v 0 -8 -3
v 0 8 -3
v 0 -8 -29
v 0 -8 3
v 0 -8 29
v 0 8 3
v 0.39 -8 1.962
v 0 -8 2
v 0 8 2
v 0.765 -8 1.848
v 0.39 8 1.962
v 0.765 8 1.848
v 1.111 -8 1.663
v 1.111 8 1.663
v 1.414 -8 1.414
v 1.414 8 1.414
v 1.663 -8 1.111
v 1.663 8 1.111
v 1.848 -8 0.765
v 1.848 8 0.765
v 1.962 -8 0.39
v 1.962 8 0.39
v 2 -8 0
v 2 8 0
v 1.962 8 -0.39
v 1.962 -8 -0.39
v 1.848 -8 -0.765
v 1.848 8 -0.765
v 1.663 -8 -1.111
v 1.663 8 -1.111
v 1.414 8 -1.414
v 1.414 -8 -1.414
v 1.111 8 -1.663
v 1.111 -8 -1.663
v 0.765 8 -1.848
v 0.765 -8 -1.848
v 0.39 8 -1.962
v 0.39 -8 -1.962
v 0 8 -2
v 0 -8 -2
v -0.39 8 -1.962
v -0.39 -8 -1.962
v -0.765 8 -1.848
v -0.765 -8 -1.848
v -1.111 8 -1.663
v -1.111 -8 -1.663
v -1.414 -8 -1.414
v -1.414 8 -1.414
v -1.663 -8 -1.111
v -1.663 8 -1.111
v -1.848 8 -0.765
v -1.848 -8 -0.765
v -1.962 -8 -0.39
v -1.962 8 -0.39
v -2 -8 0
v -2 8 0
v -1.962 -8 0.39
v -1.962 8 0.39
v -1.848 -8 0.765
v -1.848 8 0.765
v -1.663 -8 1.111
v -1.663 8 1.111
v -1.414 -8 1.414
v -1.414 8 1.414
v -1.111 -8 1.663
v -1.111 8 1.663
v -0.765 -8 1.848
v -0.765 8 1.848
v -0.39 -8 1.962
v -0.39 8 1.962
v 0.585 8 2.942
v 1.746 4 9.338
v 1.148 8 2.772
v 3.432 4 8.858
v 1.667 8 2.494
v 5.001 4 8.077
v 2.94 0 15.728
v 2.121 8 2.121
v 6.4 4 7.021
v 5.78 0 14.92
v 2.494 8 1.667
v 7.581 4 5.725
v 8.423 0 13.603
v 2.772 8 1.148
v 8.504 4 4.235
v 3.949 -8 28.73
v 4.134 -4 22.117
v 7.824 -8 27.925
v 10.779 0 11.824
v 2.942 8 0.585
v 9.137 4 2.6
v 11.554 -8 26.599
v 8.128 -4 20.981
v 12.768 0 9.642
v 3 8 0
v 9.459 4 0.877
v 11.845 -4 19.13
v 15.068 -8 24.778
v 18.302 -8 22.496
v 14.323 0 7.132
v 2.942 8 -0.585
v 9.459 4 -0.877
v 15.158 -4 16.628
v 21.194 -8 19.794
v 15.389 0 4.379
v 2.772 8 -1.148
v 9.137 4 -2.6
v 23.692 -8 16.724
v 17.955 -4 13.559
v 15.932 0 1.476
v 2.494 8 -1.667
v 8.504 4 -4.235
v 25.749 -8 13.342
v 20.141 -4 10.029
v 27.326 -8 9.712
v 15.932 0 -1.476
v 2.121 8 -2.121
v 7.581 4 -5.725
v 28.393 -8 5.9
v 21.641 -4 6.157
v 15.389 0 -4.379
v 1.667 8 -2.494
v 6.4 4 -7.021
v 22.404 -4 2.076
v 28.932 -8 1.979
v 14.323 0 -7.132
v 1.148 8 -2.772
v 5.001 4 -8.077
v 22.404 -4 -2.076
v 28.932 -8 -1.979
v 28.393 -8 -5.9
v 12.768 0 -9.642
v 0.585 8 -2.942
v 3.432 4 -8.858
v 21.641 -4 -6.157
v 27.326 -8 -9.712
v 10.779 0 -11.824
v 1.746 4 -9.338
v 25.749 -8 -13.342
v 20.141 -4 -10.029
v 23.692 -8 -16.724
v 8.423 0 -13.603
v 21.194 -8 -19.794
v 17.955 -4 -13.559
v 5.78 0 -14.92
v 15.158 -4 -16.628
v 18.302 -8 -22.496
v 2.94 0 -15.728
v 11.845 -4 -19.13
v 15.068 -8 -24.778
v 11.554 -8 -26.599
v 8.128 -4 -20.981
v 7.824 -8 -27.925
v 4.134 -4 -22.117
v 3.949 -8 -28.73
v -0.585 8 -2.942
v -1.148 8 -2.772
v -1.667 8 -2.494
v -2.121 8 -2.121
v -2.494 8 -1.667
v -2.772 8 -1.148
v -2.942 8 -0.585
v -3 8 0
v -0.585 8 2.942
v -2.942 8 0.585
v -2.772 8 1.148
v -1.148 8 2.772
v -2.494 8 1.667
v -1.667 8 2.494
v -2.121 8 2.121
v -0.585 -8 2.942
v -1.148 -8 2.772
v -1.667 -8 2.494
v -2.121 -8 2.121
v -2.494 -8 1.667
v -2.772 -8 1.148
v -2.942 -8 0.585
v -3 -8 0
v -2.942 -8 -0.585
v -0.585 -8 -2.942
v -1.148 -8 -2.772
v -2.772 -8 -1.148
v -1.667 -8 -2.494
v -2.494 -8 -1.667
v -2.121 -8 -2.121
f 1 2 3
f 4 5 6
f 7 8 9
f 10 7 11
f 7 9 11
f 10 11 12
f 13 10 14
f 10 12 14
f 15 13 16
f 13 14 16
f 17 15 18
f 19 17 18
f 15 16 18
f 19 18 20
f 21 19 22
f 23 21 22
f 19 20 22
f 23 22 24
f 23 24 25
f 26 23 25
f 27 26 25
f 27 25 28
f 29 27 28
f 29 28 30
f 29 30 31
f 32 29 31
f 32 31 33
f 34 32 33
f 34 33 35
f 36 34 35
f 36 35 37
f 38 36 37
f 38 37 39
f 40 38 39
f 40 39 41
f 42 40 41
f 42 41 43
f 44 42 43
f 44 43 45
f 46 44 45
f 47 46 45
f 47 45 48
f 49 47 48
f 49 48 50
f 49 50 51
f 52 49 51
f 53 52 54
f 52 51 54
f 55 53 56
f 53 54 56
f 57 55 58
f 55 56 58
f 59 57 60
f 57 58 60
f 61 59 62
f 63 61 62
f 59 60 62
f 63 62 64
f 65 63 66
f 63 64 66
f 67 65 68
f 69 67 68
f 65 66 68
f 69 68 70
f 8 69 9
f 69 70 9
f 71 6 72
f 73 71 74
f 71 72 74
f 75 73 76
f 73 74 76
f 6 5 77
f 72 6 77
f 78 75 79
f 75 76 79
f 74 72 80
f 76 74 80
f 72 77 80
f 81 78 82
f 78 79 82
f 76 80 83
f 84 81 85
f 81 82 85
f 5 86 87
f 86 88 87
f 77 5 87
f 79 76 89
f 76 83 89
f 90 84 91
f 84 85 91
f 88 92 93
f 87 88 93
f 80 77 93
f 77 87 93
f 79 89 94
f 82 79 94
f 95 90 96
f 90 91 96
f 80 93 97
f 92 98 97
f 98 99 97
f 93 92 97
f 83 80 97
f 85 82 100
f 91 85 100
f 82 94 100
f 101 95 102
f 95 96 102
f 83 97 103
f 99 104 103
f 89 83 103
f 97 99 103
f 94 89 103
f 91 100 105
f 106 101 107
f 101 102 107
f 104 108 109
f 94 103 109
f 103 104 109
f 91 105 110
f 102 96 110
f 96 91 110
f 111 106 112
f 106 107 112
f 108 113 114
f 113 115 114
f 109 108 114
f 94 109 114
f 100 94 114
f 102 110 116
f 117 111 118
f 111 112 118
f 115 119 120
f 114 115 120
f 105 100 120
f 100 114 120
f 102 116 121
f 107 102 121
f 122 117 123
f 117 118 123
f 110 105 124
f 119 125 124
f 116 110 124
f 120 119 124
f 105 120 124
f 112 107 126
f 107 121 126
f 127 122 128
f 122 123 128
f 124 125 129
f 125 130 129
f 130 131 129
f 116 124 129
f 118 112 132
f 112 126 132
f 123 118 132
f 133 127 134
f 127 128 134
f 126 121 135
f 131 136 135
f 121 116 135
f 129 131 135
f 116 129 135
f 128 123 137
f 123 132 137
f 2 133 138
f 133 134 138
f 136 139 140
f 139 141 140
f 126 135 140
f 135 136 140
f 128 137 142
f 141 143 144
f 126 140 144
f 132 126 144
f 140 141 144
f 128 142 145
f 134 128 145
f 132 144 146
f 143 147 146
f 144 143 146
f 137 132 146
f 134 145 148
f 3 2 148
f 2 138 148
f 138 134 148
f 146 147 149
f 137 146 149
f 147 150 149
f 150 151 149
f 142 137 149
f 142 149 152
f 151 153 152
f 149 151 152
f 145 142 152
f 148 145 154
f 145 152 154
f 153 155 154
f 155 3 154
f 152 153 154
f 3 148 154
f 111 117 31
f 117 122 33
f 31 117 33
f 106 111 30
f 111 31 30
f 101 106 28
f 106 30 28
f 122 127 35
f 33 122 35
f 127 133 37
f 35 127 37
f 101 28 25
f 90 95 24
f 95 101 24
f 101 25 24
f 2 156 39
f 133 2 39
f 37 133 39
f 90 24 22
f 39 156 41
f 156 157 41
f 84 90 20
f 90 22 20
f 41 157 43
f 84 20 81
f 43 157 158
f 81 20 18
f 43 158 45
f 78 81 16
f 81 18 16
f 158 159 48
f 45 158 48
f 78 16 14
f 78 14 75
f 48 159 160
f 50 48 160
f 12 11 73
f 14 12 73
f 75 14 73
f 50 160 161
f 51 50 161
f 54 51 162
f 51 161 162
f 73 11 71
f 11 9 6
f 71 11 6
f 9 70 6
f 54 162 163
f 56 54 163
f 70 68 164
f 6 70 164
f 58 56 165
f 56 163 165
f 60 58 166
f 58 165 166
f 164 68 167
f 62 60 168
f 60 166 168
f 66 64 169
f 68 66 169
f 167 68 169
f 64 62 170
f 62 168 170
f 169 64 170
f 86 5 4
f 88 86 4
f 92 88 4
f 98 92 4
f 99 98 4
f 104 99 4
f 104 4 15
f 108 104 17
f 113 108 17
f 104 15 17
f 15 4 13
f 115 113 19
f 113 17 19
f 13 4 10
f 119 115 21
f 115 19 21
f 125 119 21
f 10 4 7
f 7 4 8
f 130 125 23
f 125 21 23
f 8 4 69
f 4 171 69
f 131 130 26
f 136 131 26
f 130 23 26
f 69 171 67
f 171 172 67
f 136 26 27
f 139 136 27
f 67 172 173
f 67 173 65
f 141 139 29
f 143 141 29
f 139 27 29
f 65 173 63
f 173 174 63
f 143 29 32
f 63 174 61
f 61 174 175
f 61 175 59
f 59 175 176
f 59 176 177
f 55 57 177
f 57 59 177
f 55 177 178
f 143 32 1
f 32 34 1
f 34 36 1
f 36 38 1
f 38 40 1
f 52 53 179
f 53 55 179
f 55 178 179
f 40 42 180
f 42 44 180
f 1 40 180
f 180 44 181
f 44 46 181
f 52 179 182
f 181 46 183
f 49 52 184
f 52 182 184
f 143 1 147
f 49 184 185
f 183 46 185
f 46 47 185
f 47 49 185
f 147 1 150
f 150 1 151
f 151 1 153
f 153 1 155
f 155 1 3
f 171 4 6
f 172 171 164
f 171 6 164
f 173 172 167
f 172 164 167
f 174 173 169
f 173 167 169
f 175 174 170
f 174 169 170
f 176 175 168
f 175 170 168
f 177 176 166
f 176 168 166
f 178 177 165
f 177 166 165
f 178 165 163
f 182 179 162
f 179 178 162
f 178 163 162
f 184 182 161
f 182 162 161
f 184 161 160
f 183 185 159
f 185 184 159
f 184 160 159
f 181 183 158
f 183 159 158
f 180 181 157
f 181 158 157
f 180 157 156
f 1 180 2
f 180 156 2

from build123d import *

# Parameters (mm, degrees)
CORTAR_EXTRUIR1_DEPTH = 45.022721406
CROQUIS4_R            = 2
CORTAR_EXTRUIR2_DEPTH = 45.022721406


with BuildPart() as part:
    # Croquis2 → Revolución1 (revolve)
    with BuildSketch(Plane(origin=(0, 0, 0), x_dir=(0, 0, -1), z_dir=(1, 0, 0))):
        Polygon((0, -8), (0, 8), (3, 8), (29, -8), align=None)
    revolve(axis=Axis((0, -8, 0), (0, 1, 0)))

    # Croquis3 → Cortar-Extruir1 (cut, through all)
    with BuildSketch(Plane(origin=(0, 8, 0), x_dir=(1, 0, 0), z_dir=(0, 1, 0))):
        with BuildLine():
            Line((0, 3), (0, 40.325375613))
            Line((0, 40.325375613), (-47.550667512, 40.325375613))
            Line((-47.550667512, 40.325375613), (-47.550667512, -39.963713052))
            Line((-47.550667512, -39.963713052), (0, -39.963713052))
            Line((0, -39.963713052), (0, -3))
            ThreePointArc((0, -3), (-3, 0), (0, 3))
        make_face()
    extrude(amount=-CORTAR_EXTRUIR1_DEPTH, mode=Mode.SUBTRACT)

    # Croquis4 → Cortar-Extruir2 (cut, through all)
    with BuildSketch(Plane(origin=(0, 8, 0), x_dir=(1, 0, 0), z_dir=(0, 1, 0))):
        with Locations(Location((0, 0, 0), (0, 0, 270))):
            Circle(CROQUIS4_R)
    extrude(amount=-CORTAR_EXTRUIR2_DEPTH, mode=Mode.SUBTRACT)


solid = part.part
